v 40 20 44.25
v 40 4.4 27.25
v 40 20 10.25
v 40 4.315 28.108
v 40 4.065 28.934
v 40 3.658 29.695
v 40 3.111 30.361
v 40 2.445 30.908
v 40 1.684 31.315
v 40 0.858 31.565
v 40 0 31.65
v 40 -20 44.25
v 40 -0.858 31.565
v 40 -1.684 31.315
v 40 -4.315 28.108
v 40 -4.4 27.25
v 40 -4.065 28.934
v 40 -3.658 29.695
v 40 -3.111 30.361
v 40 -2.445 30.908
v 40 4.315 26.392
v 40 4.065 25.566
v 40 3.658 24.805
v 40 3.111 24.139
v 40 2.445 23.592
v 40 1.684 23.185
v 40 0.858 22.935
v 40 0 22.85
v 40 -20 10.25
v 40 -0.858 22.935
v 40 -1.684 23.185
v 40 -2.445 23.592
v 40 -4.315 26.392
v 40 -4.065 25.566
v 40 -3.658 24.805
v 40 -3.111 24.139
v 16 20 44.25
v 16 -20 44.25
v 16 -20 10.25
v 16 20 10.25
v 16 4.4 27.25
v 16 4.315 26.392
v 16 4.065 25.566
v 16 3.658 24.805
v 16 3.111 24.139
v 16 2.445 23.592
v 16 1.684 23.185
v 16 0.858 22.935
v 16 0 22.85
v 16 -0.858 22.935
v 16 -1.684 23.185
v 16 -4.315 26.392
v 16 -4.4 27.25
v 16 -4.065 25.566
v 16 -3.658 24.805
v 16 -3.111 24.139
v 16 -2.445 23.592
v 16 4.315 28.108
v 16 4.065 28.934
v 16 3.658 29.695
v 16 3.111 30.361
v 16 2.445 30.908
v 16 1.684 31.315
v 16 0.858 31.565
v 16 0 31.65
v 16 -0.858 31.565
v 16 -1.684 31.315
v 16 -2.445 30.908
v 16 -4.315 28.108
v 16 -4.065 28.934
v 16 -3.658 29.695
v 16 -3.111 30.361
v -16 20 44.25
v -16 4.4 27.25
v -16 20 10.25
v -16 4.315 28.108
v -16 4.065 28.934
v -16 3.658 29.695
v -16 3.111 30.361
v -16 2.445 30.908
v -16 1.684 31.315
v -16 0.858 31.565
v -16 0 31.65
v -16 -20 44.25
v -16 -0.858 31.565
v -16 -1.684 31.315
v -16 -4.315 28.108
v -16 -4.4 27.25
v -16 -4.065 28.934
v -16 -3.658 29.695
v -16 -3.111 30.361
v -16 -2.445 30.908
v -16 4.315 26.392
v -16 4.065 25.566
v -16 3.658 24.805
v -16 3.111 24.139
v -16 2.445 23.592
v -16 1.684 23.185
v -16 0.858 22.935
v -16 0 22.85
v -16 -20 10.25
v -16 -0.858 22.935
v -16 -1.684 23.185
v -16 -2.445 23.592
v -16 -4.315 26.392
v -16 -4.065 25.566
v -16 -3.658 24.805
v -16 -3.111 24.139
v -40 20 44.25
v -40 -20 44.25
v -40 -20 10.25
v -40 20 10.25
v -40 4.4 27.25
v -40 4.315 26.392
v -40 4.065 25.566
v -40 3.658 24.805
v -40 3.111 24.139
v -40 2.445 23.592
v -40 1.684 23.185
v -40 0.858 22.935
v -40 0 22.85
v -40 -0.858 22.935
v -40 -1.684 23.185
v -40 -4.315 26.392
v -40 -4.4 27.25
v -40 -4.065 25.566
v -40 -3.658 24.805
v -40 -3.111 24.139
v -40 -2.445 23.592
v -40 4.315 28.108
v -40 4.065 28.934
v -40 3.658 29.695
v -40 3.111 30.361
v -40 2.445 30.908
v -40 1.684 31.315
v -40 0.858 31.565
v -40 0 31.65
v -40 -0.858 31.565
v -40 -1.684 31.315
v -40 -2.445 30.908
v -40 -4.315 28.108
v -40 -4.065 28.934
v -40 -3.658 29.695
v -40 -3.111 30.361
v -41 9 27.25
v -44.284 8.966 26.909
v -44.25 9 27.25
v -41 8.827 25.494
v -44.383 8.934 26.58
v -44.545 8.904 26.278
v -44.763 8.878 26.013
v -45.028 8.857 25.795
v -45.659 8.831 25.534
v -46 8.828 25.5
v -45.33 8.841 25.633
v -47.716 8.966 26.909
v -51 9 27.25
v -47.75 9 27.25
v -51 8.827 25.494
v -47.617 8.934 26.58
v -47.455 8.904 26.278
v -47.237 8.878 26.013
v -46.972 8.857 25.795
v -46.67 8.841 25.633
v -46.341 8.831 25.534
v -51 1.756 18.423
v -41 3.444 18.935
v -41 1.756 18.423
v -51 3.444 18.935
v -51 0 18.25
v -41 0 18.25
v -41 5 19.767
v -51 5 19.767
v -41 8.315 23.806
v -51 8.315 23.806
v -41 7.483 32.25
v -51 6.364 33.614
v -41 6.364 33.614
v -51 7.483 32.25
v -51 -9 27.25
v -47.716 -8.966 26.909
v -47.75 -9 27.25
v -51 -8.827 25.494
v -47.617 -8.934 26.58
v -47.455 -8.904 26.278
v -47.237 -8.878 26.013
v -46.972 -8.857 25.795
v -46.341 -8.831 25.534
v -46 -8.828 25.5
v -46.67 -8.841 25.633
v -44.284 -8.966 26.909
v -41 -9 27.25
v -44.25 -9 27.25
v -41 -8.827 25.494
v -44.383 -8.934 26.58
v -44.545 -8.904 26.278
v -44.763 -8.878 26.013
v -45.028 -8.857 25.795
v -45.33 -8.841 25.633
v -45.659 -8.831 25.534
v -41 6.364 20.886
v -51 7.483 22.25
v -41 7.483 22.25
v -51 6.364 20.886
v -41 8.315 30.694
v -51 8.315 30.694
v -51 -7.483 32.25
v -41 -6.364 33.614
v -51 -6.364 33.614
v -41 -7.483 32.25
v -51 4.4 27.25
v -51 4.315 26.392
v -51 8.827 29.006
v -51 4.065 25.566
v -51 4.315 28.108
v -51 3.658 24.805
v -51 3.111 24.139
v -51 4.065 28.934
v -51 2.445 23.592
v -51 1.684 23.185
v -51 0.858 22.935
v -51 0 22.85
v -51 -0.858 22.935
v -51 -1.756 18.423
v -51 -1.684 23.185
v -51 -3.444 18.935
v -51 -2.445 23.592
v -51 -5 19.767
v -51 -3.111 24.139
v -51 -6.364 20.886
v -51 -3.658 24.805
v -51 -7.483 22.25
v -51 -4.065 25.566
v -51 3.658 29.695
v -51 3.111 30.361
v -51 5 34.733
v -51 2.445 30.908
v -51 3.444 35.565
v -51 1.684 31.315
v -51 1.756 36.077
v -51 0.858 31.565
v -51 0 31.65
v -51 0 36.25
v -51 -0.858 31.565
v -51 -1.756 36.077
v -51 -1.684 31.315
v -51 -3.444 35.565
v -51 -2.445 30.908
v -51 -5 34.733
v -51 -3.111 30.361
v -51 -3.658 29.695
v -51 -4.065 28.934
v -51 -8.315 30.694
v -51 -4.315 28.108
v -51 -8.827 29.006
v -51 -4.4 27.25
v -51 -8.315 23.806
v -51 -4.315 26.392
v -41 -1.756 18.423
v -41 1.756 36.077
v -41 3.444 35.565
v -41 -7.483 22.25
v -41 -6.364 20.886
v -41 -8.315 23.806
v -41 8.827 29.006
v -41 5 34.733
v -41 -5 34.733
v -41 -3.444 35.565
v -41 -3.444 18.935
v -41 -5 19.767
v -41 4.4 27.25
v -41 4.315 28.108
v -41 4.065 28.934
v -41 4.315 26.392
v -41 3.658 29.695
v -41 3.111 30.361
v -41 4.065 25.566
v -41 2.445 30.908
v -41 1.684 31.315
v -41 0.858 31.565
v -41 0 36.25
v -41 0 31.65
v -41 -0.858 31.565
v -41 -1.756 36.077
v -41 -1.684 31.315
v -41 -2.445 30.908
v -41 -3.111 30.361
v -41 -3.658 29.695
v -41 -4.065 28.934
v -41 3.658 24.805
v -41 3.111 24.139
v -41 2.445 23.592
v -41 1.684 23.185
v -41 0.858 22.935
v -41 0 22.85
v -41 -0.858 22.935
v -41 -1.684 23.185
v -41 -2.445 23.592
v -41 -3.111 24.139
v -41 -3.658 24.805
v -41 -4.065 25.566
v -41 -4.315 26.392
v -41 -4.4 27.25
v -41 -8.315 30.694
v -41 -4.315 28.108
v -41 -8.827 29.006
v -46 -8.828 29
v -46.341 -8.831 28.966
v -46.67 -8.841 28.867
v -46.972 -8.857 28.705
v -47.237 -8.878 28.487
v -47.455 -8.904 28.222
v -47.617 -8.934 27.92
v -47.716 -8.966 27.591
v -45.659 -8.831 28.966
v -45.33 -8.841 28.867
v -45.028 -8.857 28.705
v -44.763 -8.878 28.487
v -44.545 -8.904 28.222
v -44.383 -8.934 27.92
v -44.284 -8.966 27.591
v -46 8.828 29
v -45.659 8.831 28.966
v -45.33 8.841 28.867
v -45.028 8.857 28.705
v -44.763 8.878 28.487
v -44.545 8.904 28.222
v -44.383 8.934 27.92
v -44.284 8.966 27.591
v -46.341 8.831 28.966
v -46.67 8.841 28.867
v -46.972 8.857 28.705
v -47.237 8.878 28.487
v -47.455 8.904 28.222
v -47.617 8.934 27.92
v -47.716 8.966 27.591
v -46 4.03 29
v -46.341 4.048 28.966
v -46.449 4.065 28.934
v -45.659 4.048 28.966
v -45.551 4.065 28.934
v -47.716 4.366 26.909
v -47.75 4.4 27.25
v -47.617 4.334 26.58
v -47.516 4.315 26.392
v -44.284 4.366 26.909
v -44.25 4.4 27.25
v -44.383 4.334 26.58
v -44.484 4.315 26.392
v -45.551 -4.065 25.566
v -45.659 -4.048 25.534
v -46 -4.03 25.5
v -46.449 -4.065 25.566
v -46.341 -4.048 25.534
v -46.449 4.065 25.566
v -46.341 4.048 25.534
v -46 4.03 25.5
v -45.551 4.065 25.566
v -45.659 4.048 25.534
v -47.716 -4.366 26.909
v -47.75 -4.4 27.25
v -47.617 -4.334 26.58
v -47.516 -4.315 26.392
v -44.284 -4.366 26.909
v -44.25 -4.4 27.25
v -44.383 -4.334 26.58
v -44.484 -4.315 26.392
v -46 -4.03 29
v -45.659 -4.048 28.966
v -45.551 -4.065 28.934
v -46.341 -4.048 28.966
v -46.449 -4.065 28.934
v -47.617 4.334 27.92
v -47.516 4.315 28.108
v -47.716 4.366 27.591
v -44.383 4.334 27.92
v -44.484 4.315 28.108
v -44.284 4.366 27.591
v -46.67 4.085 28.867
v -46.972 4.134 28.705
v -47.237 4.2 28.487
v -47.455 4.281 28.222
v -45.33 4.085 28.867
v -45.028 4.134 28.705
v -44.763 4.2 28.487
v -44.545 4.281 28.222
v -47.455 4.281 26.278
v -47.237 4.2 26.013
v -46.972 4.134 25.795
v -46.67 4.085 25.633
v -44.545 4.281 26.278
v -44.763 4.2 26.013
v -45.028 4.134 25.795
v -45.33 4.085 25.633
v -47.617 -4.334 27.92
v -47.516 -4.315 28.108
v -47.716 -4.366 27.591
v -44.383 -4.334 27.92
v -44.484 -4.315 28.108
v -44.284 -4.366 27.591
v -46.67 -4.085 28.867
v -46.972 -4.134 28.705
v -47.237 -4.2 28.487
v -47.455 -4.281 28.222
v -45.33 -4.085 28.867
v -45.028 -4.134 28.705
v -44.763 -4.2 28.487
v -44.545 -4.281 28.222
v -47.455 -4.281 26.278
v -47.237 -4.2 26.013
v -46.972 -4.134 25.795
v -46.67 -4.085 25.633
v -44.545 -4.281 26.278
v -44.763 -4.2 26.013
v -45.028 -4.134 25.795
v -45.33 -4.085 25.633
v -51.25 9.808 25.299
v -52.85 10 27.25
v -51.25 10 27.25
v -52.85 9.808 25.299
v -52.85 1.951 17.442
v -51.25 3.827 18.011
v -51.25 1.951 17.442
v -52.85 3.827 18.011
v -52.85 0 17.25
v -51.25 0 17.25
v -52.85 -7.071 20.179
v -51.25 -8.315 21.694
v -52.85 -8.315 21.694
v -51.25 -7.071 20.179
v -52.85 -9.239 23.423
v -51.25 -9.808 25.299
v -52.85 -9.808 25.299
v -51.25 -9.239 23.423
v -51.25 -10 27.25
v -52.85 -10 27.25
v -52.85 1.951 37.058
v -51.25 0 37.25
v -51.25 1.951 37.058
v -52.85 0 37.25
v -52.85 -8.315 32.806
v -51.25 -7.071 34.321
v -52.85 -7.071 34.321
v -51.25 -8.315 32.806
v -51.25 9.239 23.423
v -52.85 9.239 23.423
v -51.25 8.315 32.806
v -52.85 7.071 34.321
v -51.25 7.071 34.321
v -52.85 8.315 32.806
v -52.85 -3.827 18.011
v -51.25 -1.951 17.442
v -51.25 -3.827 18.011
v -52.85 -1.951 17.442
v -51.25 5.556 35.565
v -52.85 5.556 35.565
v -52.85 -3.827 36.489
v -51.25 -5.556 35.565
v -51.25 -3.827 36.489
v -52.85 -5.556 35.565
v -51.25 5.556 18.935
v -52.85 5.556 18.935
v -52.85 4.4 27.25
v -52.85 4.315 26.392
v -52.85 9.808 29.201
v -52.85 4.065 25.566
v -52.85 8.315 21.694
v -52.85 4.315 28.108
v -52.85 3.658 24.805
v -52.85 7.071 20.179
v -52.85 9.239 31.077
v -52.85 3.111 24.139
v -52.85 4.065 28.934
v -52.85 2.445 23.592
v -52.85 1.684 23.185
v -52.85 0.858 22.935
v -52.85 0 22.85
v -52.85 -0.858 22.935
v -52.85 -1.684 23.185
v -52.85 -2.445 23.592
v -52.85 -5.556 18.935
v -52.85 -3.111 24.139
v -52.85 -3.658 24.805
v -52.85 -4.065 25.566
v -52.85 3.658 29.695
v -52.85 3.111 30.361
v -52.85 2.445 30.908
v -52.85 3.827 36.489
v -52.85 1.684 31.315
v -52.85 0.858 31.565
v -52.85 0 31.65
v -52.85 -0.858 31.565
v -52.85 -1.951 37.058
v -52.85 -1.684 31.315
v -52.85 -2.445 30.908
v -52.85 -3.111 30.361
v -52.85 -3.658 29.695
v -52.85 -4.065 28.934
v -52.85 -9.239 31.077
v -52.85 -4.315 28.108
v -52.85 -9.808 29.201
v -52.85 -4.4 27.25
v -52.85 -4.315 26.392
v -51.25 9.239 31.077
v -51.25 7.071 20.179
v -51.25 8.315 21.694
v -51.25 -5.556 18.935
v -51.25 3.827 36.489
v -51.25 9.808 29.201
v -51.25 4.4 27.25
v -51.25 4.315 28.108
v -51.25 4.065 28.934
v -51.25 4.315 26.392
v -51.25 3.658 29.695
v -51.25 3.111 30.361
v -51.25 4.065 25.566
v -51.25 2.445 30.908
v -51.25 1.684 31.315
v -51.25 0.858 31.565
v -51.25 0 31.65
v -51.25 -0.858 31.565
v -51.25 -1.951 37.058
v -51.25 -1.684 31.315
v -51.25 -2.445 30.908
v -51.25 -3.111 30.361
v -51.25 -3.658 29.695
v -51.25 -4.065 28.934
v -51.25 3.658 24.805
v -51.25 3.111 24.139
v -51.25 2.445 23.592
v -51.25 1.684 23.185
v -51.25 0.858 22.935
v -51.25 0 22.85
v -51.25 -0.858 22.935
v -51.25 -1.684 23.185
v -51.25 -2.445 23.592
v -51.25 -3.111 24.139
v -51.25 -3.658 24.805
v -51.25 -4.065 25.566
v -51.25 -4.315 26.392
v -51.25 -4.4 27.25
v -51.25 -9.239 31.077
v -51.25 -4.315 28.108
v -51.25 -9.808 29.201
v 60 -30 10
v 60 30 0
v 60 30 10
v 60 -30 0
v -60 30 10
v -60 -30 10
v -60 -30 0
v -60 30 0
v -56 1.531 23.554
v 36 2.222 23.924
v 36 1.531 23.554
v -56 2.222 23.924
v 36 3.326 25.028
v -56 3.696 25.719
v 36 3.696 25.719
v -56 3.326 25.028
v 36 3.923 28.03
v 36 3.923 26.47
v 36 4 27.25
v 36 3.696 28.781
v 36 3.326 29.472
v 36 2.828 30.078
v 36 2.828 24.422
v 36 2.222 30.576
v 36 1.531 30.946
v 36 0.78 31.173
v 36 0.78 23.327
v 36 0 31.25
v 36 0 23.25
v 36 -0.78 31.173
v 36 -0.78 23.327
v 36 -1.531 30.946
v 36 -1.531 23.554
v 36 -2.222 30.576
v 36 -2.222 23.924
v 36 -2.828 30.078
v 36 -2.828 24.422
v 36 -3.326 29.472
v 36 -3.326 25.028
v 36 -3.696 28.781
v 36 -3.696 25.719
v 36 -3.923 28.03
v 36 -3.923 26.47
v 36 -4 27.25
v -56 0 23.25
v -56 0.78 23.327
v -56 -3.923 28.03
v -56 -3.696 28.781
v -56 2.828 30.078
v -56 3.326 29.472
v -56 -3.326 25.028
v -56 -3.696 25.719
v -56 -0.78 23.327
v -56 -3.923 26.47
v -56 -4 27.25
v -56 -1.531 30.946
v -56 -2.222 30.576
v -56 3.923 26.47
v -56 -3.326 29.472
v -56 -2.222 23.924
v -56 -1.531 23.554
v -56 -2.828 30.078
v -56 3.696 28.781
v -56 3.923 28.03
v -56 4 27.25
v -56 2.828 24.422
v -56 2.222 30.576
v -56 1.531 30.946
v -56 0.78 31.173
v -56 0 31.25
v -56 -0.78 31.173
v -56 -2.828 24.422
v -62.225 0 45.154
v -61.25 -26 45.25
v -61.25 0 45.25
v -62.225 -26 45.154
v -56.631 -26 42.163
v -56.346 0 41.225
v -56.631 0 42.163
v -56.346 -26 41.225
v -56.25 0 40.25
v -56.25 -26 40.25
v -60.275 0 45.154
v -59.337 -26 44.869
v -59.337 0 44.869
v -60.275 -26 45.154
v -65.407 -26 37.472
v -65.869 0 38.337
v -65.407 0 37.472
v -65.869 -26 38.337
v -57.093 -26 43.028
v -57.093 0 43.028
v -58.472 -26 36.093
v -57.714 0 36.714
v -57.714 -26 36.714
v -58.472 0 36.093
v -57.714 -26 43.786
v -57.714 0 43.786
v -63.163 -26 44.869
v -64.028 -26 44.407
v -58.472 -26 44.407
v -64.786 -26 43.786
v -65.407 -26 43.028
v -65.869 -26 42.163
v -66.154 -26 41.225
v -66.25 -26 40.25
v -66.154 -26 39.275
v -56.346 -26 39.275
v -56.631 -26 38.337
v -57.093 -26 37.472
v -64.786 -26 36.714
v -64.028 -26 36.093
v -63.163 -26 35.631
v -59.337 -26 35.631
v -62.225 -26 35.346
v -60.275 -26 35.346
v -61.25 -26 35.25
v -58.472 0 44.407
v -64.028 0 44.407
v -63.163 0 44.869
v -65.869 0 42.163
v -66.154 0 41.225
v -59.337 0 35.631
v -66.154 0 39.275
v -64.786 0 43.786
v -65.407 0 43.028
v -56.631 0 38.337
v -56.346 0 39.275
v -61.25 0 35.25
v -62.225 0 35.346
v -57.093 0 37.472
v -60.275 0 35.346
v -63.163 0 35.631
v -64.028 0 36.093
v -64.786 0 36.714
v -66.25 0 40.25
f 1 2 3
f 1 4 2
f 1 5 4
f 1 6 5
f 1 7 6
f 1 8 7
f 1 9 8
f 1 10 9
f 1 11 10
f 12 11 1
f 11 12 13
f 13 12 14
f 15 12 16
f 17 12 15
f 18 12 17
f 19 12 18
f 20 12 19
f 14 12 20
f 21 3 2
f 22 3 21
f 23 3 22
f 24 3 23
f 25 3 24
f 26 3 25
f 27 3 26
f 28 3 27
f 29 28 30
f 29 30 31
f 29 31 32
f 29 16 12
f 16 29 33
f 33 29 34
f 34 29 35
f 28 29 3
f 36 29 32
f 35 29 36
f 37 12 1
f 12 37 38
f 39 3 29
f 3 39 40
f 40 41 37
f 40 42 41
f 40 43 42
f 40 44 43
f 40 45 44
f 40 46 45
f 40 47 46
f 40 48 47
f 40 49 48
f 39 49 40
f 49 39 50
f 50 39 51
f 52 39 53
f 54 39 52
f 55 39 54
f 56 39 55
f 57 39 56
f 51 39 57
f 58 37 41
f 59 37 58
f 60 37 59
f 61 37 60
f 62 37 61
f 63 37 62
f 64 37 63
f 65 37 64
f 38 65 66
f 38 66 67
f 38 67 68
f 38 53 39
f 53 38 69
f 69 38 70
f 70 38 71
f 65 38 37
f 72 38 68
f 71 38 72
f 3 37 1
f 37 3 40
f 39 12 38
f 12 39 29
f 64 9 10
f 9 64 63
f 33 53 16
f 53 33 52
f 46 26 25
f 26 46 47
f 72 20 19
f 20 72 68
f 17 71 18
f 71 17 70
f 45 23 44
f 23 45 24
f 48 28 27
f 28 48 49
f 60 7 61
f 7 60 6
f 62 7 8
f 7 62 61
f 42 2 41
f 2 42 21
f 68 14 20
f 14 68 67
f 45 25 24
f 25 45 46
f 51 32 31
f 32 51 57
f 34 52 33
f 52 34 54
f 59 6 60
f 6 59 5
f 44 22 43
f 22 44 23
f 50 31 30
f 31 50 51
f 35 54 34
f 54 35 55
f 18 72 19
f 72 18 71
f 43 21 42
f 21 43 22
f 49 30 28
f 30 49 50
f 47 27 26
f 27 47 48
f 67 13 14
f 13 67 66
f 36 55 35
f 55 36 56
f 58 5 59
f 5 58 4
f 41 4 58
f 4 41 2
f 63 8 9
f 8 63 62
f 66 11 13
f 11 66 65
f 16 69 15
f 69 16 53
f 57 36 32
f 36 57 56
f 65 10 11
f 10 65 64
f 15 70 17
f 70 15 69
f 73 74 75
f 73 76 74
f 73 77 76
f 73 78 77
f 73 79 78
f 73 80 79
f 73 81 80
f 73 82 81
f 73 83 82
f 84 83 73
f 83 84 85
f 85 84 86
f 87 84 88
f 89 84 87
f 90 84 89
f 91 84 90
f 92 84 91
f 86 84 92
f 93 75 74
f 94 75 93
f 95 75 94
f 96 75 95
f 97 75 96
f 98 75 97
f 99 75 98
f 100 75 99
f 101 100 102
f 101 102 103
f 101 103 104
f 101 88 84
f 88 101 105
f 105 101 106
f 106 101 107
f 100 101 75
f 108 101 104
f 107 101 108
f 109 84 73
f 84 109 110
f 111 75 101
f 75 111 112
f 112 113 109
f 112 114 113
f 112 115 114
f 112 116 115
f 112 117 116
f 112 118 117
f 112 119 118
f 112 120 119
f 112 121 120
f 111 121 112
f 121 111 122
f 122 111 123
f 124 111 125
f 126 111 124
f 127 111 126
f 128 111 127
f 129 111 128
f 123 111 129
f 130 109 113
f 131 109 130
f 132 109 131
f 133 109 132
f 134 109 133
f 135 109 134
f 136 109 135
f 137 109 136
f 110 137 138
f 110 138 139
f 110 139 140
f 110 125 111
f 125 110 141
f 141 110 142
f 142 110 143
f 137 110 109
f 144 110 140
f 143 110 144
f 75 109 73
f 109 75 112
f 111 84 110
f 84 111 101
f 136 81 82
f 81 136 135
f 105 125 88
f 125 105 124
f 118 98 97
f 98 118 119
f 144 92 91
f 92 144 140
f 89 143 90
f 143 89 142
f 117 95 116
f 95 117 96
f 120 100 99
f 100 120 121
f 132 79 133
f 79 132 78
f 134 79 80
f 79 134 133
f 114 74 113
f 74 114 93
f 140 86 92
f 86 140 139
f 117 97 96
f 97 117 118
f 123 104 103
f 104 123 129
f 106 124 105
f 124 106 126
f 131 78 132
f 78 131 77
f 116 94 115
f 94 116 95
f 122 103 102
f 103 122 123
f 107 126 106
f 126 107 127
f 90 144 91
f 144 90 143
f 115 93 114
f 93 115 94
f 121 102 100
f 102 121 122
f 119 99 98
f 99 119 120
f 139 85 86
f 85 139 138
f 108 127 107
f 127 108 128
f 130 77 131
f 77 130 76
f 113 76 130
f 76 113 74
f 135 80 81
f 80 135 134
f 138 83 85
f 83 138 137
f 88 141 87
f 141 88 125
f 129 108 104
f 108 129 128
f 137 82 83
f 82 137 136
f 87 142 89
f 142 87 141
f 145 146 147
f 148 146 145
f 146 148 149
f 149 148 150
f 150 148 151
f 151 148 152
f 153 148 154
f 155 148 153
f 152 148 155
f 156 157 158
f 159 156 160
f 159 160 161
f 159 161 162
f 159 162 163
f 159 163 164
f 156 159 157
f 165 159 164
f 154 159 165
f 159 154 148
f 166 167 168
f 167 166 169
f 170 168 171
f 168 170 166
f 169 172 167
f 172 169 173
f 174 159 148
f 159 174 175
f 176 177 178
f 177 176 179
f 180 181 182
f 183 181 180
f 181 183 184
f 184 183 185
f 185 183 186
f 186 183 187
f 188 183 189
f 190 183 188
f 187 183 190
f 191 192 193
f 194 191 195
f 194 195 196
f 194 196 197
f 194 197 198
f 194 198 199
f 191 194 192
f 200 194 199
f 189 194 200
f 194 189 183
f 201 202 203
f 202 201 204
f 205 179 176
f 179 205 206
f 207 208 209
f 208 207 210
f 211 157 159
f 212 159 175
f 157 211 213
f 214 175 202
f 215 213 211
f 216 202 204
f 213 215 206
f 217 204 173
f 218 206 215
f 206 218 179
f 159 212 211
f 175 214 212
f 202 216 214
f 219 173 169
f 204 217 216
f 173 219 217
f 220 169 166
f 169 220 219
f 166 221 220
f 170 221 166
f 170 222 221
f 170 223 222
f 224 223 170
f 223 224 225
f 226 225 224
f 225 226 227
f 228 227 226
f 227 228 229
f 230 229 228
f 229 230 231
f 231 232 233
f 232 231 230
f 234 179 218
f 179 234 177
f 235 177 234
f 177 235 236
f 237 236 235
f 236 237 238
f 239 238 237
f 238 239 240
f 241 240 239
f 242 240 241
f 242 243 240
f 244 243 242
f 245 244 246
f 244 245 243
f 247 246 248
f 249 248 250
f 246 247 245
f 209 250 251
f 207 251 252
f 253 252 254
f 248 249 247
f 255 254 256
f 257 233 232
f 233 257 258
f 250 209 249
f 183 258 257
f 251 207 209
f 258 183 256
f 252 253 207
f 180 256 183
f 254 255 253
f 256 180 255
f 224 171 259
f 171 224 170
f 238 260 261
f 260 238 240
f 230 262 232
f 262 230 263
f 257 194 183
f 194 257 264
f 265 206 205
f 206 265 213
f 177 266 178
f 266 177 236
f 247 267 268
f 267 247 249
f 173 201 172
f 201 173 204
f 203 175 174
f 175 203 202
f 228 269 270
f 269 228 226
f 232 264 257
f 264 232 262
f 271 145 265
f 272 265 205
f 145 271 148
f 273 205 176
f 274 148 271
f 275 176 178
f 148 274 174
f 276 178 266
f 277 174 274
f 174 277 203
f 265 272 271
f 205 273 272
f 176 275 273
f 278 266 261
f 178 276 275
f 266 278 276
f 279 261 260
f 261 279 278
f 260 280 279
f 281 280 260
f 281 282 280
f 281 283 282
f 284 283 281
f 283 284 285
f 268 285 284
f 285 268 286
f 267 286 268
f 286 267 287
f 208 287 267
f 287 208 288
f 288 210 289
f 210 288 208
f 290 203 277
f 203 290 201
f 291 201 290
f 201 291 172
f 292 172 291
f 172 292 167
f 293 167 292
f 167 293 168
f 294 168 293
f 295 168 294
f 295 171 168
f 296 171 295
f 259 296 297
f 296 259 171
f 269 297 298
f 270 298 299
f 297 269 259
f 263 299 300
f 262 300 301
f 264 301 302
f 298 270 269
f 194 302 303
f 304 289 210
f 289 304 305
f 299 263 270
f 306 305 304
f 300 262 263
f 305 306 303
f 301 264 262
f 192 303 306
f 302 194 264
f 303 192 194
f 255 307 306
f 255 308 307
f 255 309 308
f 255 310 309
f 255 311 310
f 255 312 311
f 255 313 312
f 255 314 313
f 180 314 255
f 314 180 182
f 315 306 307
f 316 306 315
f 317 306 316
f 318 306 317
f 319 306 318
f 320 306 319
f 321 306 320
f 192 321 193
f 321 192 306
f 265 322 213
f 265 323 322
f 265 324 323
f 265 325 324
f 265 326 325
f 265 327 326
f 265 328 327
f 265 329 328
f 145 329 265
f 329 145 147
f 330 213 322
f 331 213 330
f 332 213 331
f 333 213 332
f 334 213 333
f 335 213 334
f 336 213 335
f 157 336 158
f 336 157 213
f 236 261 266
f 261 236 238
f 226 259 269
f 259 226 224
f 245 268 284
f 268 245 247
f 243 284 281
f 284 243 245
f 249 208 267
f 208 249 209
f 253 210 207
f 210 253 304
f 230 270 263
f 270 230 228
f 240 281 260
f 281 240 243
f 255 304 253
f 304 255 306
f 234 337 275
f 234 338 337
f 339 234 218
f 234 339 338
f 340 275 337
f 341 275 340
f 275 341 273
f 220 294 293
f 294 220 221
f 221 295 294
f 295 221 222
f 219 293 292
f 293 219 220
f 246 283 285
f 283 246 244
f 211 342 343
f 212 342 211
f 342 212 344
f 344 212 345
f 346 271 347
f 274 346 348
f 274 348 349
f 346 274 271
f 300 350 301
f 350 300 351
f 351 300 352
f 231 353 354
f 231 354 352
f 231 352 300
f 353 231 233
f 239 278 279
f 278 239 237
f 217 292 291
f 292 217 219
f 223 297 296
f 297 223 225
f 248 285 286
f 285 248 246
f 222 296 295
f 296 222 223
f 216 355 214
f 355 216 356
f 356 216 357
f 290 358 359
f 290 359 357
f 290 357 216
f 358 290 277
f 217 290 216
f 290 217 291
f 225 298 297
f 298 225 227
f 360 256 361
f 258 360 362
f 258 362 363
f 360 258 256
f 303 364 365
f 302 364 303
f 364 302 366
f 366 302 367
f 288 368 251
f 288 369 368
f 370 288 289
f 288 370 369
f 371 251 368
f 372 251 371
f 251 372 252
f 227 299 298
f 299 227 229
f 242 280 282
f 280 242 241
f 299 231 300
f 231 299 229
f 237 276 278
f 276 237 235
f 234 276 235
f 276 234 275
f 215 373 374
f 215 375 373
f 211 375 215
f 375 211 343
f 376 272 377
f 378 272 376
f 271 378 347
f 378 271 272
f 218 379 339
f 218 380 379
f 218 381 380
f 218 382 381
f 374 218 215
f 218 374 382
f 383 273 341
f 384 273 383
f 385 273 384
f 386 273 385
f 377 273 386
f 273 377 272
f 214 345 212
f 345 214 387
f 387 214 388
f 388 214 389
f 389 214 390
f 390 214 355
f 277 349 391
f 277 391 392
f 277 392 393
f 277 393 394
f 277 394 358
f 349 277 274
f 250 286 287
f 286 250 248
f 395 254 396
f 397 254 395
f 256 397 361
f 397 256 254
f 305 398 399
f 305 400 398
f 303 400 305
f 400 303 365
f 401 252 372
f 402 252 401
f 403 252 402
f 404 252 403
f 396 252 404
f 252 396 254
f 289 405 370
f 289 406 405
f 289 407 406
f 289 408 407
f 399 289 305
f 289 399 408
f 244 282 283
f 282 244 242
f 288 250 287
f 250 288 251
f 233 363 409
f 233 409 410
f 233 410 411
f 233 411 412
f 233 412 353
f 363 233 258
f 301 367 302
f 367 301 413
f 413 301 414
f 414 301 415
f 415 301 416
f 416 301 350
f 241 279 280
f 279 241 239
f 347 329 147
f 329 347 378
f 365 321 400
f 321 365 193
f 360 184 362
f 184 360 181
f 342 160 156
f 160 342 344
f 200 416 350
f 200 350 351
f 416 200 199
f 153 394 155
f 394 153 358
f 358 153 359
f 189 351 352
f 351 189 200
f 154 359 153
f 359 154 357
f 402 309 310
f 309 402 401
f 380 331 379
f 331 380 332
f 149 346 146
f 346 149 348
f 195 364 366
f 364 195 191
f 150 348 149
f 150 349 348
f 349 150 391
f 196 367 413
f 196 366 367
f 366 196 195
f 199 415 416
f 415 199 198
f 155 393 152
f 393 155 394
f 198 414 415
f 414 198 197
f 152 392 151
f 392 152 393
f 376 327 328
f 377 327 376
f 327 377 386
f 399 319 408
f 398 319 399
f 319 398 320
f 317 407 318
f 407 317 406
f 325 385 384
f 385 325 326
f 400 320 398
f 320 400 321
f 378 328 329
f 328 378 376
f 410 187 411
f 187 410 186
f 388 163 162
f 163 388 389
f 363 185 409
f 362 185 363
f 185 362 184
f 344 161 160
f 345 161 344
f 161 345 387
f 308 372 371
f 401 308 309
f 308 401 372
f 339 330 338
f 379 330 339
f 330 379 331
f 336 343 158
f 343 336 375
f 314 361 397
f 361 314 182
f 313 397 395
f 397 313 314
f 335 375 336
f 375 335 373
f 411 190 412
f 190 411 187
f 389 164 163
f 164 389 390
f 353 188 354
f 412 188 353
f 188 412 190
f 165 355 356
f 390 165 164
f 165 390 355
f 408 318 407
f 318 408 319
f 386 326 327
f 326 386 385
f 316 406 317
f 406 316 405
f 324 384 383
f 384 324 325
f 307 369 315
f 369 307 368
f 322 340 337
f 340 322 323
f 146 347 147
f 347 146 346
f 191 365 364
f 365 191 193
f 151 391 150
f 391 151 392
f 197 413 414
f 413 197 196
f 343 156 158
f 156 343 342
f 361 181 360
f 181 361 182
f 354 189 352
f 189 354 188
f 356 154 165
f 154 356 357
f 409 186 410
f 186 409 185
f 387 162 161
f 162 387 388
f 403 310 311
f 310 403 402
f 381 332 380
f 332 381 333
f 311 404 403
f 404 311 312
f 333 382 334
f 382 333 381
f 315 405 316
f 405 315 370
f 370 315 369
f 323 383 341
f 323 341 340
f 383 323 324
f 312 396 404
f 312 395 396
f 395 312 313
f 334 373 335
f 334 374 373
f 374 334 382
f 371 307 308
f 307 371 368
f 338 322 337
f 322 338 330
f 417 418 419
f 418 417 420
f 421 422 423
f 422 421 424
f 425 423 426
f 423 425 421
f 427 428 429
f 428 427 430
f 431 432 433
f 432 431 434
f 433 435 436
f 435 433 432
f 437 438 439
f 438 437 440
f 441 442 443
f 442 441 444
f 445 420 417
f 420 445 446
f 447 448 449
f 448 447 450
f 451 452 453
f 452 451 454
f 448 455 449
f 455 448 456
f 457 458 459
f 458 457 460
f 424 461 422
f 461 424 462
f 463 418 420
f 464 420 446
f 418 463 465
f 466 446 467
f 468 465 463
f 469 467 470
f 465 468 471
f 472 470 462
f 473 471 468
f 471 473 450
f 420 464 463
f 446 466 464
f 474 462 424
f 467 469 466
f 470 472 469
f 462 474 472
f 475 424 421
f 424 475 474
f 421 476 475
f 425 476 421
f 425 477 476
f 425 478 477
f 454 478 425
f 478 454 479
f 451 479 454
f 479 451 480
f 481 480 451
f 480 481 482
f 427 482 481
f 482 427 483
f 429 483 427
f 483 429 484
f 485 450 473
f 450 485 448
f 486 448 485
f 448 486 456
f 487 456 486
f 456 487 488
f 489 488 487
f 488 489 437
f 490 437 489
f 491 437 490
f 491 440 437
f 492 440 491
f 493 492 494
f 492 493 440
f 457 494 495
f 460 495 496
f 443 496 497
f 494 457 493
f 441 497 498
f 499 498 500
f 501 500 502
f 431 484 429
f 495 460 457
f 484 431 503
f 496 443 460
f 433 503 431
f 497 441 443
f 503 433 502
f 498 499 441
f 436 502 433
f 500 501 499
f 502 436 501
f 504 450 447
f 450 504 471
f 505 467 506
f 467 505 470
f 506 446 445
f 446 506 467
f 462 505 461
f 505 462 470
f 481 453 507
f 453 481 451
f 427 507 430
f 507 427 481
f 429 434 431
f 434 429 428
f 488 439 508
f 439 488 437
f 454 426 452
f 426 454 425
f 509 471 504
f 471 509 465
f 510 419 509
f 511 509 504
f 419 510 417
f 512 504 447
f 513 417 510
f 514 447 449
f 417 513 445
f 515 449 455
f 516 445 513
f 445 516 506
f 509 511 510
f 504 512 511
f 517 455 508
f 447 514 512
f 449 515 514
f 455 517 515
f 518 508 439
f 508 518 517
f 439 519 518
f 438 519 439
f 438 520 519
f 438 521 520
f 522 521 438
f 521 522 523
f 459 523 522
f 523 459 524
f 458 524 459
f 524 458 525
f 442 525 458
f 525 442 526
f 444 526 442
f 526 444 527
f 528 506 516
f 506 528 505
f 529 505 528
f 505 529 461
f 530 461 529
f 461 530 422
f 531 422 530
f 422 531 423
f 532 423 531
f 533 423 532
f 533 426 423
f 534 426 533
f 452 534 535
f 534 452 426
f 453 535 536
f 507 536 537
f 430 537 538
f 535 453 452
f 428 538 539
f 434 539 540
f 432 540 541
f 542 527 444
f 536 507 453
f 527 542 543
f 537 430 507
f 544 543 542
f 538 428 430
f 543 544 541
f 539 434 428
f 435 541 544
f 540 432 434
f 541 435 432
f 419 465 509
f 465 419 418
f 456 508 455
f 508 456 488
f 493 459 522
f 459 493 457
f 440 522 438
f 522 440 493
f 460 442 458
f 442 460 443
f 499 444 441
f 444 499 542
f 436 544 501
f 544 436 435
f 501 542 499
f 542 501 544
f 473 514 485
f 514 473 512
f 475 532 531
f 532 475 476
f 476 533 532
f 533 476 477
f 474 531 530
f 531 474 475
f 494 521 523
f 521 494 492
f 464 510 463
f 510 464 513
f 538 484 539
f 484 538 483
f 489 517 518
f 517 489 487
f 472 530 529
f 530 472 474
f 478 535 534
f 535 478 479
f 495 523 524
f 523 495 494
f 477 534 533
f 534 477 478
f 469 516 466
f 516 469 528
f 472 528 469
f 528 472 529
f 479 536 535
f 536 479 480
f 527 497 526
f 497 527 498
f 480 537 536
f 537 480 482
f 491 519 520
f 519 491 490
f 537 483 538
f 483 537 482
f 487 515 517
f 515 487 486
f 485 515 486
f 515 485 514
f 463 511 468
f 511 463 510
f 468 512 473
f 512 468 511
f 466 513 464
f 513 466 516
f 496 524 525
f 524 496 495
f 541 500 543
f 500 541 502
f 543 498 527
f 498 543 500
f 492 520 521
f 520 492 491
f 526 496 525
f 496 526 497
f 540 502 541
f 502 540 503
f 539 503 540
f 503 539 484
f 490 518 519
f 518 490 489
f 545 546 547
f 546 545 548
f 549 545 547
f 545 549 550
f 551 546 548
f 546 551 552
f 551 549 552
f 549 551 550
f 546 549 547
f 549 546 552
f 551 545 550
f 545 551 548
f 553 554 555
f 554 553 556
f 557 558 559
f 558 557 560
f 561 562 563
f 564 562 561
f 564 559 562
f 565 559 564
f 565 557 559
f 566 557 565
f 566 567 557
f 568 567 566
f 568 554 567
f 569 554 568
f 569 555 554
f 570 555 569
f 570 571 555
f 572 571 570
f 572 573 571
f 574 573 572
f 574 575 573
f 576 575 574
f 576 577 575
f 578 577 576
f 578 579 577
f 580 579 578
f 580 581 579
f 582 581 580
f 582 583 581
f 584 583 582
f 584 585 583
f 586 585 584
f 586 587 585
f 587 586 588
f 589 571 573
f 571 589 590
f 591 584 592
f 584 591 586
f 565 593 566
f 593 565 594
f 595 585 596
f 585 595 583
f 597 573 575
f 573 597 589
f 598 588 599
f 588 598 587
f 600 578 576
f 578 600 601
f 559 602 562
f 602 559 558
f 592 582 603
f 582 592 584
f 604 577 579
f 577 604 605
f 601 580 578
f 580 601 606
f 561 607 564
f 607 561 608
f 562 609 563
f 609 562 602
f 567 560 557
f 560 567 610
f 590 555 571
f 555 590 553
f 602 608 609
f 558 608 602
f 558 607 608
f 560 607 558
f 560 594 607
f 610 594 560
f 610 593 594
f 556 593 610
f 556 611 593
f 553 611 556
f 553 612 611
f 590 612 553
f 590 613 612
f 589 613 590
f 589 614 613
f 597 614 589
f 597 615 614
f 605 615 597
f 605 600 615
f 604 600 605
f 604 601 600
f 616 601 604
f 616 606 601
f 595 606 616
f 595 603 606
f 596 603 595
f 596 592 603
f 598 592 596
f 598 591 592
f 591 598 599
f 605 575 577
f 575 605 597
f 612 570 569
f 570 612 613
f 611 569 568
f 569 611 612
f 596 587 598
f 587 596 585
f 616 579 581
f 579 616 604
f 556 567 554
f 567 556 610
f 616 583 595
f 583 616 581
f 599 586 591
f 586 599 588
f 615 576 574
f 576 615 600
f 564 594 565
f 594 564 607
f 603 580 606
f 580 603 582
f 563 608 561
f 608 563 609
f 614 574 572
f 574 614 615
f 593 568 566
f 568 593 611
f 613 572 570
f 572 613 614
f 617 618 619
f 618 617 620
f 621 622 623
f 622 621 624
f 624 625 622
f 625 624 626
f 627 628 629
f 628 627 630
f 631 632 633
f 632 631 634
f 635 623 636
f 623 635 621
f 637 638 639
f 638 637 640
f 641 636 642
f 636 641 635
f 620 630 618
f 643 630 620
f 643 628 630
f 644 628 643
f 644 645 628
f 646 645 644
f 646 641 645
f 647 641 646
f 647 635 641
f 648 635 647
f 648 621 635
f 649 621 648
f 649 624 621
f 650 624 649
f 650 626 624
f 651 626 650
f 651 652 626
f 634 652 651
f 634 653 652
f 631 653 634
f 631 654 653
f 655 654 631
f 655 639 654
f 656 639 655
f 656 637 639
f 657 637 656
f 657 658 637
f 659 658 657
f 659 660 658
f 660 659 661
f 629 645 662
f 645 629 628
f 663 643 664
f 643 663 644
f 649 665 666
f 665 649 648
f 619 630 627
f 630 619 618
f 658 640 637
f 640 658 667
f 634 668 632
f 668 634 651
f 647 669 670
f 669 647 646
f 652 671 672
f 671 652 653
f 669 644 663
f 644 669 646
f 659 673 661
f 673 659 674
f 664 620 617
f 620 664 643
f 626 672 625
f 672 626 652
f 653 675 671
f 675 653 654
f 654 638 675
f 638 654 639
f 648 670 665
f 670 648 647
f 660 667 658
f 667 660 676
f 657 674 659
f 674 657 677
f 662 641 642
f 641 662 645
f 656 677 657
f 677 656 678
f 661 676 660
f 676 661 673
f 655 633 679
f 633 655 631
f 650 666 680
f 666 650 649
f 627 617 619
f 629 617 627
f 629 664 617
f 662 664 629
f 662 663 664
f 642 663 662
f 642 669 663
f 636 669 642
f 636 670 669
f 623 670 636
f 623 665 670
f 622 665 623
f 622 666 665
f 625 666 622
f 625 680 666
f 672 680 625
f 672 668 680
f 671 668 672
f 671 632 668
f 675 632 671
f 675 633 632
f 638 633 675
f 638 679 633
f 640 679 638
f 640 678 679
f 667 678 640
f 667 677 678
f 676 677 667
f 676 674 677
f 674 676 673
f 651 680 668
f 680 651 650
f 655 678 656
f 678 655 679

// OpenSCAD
$fn = 32;

// ------------------------------------------------------------------------
// Machine vise: screw d8, jaws 24 x 34 mm
// Every part is its own module, assembly() places every instance.
// ------------------------------------------------------------------------

// --- part 1 ---
module vise_bed() {
  difference() {
    translate([-60, -30, 0]) cube([120, 60, 10]);
  }
}

// --- part 2 ---
module vise_jaw() {
  difference() {
    translate([-12, -20, 0]) cube([24, 40, 34]);
    translate([0, 0, 17]) rotate([0, 90, 0]) cylinder(h = 26, d = 8.8, center = true);
  }
}

// --- part 3 ---
module vise_screw() {
  translate([0, 0, -46]) cylinder(h = 92, d = 8);
}

// --- part 4 ---
module screw_collar() {
  difference() {
    cylinder(h = 10, d = 18);
    translate([0, 0, -1]) cylinder(h = 12, d = 8.8);
    translate([0, 0, 5]) rotate([90, 0, 0]) cylinder(h = 20, d = 3.5, center = true);
  }
}

// --- part 5 ---
module screw_washer() {
  difference() {
      translate([0, 0, 0]) cylinder(h = 1.6, d = 20);
      translate([0, 0, -1]) cylinder(h = 3.6, d = 8.8);
    }
}

// --- part 6 ---
module vise_handle() {
  cylinder(h = 26, d = 10);
}

// --- assembly ---
module assembly() {
  color([0.80, 0.24, 0.20]) translate([0, 0, 0]) rotate([0, 0, 0]) vise_bed();
  color([0.20, 0.45, 0.75]) translate([28, 0, 10.25]) rotate([0, 0, 0]) vise_jaw();
  color([0.25, 0.62, 0.32]) translate([-28, 0, 10.25]) rotate([0, 0, 0]) vise_jaw();
  color([0.92, 0.70, 0.18]) translate([-10, 0, 27.25]) rotate([0, 90, 0]) vise_screw();
  color([0.58, 0.35, 0.70]) translate([-51, 0, 27.25]) rotate([0, 90, 0]) screw_collar();
  color([0.16, 0.66, 0.66]) translate([-52.85, 0, 27.25]) rotate([0, 90, 0]) screw_washer();
  color([0.85, 0.48, 0.18]) translate([-61.25, 0, 40.25]) rotate([90, 0, 0]) vise_handle();
}

assembly();
